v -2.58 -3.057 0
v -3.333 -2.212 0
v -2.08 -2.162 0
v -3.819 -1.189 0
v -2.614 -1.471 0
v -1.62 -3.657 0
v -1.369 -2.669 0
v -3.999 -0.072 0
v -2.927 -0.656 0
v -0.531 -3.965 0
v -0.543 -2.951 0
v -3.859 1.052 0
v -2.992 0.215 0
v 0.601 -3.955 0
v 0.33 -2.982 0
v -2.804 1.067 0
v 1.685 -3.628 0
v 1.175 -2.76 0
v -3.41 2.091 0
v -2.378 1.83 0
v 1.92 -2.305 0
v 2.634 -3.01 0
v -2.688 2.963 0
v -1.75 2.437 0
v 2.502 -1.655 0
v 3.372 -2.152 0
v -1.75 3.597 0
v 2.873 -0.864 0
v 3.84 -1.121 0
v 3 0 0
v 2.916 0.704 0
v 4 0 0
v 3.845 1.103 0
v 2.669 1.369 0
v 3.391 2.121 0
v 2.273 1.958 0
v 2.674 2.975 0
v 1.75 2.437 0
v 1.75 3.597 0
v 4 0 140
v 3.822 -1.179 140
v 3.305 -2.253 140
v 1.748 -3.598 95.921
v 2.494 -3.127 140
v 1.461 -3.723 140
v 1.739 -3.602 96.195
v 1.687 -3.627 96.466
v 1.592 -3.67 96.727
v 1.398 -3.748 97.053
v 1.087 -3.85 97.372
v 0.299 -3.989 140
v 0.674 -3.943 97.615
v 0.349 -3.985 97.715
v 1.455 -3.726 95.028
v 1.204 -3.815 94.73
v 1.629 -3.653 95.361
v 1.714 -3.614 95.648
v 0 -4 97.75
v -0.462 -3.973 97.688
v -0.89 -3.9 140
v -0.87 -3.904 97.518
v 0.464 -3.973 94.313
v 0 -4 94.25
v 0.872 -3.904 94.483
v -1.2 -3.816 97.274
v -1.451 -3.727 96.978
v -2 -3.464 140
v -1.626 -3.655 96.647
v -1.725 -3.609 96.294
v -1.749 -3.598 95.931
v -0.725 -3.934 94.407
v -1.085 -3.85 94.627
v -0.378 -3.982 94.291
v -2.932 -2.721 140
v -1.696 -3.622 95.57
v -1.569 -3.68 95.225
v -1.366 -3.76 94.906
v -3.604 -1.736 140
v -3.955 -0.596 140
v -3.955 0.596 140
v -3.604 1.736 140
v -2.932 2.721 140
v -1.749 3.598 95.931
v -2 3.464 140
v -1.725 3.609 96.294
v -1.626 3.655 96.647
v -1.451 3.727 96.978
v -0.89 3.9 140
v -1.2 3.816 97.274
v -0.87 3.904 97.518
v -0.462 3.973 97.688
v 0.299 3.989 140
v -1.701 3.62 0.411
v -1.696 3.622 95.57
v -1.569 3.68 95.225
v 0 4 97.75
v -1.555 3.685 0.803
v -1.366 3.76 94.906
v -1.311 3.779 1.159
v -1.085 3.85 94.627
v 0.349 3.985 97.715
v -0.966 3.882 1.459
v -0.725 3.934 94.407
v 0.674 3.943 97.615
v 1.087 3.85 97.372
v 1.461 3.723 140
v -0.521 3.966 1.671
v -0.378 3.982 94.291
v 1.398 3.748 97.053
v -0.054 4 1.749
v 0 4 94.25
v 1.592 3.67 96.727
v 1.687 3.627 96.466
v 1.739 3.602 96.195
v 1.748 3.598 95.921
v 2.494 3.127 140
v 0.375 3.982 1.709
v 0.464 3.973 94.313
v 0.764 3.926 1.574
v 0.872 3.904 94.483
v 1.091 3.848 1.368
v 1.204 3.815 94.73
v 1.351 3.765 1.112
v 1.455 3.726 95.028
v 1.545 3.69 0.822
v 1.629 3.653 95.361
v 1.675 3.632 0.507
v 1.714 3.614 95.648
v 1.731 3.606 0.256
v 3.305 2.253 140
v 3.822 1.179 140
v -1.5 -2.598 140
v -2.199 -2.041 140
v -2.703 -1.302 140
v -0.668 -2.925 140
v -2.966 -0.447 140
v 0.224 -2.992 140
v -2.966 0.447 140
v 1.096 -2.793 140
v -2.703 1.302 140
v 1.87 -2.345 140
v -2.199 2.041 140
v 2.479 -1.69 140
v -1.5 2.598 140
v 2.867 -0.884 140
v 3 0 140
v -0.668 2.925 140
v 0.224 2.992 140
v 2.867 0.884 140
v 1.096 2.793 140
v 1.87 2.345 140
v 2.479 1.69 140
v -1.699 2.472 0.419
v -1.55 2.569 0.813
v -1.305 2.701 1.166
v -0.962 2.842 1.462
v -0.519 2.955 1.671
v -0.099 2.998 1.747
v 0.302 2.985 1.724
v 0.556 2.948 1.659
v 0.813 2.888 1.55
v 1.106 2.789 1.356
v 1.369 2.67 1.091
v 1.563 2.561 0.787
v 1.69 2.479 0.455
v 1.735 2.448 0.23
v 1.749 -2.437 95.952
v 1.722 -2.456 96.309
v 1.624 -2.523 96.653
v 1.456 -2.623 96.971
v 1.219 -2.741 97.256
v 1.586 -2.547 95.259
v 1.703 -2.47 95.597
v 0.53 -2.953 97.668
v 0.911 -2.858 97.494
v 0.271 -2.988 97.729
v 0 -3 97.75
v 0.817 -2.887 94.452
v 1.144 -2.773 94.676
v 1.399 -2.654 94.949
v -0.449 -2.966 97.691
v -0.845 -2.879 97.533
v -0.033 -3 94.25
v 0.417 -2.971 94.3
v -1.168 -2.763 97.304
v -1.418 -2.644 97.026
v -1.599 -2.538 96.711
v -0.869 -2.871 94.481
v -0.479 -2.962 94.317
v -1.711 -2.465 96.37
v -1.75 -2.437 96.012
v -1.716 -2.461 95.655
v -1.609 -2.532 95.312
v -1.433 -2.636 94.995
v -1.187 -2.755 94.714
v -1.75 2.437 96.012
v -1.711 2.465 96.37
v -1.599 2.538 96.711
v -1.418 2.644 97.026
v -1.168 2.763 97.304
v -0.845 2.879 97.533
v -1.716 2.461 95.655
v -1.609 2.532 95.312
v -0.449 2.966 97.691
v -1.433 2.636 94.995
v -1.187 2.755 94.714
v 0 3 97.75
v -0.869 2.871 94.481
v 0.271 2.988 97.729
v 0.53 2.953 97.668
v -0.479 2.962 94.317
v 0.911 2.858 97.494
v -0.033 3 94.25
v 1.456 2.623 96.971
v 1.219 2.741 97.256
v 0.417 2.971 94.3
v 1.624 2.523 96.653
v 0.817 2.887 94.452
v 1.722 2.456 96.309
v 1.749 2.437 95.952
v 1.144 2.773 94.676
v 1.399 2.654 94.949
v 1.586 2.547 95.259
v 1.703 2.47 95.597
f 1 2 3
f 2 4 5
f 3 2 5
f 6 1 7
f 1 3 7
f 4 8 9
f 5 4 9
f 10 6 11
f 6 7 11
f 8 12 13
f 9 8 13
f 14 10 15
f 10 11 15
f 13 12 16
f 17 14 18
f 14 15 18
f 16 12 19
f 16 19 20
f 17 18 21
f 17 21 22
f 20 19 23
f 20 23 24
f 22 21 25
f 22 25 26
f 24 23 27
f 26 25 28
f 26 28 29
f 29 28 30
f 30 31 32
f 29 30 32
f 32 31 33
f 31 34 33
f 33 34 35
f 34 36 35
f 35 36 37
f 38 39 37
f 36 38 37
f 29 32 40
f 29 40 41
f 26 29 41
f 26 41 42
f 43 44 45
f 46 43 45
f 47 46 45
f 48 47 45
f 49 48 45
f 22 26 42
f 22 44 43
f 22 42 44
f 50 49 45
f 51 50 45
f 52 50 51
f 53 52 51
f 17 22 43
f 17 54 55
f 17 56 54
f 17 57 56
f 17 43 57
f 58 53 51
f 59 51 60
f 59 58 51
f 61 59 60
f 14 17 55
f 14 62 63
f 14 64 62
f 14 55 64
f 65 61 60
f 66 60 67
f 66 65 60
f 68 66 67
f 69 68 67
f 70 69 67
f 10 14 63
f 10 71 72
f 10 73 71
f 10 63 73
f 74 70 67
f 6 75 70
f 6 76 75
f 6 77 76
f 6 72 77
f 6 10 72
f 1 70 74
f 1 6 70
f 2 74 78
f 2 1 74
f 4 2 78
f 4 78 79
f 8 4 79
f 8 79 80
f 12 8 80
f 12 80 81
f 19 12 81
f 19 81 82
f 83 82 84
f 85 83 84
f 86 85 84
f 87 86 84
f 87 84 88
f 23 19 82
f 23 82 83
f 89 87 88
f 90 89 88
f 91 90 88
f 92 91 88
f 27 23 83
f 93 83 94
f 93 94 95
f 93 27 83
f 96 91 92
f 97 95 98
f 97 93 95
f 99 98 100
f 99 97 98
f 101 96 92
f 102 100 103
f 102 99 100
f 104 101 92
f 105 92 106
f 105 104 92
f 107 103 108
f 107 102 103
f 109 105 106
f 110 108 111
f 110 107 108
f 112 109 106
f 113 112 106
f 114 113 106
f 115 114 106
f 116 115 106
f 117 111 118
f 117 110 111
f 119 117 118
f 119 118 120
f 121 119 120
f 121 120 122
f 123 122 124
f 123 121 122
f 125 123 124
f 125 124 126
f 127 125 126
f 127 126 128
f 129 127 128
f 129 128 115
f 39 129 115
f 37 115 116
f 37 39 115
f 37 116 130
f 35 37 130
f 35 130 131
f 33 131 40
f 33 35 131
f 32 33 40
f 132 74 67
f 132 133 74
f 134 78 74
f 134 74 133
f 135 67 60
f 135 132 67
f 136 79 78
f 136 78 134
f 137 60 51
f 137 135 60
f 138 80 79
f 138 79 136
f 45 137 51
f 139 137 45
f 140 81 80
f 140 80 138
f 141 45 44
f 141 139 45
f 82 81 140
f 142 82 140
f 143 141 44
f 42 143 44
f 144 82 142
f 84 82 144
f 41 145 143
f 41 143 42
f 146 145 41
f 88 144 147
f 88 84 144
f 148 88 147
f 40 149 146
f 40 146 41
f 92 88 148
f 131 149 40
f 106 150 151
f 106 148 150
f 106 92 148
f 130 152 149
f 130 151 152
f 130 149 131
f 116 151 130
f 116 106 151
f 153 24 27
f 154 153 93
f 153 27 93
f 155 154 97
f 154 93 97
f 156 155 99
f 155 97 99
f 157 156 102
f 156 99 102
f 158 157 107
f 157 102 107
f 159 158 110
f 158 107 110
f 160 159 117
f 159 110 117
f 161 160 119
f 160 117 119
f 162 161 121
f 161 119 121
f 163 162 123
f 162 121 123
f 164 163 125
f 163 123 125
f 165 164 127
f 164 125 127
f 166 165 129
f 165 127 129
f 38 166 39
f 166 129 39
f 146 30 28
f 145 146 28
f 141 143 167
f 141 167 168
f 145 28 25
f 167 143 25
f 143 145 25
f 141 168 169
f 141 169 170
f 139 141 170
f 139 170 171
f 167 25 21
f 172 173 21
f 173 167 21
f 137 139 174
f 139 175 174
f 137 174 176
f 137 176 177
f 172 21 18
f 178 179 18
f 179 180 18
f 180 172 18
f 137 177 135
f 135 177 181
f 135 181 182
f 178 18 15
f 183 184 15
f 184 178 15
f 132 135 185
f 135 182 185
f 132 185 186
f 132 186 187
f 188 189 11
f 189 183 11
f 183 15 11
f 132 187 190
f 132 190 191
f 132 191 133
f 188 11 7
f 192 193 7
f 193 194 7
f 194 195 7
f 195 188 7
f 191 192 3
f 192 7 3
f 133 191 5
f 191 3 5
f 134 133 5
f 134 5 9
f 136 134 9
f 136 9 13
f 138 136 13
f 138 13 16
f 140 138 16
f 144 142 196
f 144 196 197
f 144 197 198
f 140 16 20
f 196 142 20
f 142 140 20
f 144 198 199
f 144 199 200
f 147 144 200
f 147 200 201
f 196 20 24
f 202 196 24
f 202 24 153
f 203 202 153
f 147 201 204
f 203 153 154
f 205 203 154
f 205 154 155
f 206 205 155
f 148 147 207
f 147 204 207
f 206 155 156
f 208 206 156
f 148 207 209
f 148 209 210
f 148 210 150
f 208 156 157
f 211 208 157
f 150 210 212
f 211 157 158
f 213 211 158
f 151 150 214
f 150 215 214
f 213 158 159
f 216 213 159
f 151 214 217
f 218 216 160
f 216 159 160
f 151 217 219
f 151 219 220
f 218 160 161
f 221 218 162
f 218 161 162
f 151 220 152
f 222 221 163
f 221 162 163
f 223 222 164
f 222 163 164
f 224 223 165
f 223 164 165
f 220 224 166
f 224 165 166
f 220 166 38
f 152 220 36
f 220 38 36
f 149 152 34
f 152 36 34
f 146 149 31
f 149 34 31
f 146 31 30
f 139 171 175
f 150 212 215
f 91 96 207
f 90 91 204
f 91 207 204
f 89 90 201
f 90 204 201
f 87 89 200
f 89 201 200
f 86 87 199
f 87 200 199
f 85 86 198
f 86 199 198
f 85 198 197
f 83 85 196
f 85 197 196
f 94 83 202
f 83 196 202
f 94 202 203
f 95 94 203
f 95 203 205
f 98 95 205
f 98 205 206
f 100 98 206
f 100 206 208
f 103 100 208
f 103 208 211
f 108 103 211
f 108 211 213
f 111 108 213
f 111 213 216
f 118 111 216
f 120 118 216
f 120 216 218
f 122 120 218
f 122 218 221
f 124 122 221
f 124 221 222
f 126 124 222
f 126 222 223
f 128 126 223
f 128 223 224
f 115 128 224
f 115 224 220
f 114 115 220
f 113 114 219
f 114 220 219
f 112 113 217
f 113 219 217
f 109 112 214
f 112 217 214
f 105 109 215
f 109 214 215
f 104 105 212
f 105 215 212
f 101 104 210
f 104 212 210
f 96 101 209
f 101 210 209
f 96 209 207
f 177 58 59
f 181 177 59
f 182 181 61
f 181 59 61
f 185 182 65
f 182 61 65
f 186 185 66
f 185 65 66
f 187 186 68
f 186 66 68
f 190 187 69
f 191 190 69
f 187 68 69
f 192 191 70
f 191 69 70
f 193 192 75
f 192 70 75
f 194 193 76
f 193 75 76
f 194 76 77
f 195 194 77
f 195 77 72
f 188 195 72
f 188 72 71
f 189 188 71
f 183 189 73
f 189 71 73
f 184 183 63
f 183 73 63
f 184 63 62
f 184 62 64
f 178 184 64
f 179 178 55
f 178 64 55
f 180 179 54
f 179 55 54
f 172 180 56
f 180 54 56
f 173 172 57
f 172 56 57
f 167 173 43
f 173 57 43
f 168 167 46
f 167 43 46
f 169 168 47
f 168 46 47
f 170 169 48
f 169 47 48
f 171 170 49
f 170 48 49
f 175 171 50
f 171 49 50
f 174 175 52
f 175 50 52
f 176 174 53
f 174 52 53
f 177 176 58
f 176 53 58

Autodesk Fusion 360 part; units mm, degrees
sketch "Esquisse1" plane through (0, 0, 0) normal (0, 0, 1) x (1, 0, 0)
  circle A0 centre (0, 0) radius 4
  circle A1 centre (0, 0) radius 3
  dimension "d1" = 8
  dimension "d2" = 6
extrude "Extrusion1" add sketch "Esquisse1" along normal blind 140
hole "Perçage1" at (0, 0, 0) direction (0, 1, 0) diameter 3.5 depth 8 tip angle 180
hole "Perçage2" at (0, 4, 96) direction (0, -1, 0) diameter 3.5 depth 8 tip angle 180
